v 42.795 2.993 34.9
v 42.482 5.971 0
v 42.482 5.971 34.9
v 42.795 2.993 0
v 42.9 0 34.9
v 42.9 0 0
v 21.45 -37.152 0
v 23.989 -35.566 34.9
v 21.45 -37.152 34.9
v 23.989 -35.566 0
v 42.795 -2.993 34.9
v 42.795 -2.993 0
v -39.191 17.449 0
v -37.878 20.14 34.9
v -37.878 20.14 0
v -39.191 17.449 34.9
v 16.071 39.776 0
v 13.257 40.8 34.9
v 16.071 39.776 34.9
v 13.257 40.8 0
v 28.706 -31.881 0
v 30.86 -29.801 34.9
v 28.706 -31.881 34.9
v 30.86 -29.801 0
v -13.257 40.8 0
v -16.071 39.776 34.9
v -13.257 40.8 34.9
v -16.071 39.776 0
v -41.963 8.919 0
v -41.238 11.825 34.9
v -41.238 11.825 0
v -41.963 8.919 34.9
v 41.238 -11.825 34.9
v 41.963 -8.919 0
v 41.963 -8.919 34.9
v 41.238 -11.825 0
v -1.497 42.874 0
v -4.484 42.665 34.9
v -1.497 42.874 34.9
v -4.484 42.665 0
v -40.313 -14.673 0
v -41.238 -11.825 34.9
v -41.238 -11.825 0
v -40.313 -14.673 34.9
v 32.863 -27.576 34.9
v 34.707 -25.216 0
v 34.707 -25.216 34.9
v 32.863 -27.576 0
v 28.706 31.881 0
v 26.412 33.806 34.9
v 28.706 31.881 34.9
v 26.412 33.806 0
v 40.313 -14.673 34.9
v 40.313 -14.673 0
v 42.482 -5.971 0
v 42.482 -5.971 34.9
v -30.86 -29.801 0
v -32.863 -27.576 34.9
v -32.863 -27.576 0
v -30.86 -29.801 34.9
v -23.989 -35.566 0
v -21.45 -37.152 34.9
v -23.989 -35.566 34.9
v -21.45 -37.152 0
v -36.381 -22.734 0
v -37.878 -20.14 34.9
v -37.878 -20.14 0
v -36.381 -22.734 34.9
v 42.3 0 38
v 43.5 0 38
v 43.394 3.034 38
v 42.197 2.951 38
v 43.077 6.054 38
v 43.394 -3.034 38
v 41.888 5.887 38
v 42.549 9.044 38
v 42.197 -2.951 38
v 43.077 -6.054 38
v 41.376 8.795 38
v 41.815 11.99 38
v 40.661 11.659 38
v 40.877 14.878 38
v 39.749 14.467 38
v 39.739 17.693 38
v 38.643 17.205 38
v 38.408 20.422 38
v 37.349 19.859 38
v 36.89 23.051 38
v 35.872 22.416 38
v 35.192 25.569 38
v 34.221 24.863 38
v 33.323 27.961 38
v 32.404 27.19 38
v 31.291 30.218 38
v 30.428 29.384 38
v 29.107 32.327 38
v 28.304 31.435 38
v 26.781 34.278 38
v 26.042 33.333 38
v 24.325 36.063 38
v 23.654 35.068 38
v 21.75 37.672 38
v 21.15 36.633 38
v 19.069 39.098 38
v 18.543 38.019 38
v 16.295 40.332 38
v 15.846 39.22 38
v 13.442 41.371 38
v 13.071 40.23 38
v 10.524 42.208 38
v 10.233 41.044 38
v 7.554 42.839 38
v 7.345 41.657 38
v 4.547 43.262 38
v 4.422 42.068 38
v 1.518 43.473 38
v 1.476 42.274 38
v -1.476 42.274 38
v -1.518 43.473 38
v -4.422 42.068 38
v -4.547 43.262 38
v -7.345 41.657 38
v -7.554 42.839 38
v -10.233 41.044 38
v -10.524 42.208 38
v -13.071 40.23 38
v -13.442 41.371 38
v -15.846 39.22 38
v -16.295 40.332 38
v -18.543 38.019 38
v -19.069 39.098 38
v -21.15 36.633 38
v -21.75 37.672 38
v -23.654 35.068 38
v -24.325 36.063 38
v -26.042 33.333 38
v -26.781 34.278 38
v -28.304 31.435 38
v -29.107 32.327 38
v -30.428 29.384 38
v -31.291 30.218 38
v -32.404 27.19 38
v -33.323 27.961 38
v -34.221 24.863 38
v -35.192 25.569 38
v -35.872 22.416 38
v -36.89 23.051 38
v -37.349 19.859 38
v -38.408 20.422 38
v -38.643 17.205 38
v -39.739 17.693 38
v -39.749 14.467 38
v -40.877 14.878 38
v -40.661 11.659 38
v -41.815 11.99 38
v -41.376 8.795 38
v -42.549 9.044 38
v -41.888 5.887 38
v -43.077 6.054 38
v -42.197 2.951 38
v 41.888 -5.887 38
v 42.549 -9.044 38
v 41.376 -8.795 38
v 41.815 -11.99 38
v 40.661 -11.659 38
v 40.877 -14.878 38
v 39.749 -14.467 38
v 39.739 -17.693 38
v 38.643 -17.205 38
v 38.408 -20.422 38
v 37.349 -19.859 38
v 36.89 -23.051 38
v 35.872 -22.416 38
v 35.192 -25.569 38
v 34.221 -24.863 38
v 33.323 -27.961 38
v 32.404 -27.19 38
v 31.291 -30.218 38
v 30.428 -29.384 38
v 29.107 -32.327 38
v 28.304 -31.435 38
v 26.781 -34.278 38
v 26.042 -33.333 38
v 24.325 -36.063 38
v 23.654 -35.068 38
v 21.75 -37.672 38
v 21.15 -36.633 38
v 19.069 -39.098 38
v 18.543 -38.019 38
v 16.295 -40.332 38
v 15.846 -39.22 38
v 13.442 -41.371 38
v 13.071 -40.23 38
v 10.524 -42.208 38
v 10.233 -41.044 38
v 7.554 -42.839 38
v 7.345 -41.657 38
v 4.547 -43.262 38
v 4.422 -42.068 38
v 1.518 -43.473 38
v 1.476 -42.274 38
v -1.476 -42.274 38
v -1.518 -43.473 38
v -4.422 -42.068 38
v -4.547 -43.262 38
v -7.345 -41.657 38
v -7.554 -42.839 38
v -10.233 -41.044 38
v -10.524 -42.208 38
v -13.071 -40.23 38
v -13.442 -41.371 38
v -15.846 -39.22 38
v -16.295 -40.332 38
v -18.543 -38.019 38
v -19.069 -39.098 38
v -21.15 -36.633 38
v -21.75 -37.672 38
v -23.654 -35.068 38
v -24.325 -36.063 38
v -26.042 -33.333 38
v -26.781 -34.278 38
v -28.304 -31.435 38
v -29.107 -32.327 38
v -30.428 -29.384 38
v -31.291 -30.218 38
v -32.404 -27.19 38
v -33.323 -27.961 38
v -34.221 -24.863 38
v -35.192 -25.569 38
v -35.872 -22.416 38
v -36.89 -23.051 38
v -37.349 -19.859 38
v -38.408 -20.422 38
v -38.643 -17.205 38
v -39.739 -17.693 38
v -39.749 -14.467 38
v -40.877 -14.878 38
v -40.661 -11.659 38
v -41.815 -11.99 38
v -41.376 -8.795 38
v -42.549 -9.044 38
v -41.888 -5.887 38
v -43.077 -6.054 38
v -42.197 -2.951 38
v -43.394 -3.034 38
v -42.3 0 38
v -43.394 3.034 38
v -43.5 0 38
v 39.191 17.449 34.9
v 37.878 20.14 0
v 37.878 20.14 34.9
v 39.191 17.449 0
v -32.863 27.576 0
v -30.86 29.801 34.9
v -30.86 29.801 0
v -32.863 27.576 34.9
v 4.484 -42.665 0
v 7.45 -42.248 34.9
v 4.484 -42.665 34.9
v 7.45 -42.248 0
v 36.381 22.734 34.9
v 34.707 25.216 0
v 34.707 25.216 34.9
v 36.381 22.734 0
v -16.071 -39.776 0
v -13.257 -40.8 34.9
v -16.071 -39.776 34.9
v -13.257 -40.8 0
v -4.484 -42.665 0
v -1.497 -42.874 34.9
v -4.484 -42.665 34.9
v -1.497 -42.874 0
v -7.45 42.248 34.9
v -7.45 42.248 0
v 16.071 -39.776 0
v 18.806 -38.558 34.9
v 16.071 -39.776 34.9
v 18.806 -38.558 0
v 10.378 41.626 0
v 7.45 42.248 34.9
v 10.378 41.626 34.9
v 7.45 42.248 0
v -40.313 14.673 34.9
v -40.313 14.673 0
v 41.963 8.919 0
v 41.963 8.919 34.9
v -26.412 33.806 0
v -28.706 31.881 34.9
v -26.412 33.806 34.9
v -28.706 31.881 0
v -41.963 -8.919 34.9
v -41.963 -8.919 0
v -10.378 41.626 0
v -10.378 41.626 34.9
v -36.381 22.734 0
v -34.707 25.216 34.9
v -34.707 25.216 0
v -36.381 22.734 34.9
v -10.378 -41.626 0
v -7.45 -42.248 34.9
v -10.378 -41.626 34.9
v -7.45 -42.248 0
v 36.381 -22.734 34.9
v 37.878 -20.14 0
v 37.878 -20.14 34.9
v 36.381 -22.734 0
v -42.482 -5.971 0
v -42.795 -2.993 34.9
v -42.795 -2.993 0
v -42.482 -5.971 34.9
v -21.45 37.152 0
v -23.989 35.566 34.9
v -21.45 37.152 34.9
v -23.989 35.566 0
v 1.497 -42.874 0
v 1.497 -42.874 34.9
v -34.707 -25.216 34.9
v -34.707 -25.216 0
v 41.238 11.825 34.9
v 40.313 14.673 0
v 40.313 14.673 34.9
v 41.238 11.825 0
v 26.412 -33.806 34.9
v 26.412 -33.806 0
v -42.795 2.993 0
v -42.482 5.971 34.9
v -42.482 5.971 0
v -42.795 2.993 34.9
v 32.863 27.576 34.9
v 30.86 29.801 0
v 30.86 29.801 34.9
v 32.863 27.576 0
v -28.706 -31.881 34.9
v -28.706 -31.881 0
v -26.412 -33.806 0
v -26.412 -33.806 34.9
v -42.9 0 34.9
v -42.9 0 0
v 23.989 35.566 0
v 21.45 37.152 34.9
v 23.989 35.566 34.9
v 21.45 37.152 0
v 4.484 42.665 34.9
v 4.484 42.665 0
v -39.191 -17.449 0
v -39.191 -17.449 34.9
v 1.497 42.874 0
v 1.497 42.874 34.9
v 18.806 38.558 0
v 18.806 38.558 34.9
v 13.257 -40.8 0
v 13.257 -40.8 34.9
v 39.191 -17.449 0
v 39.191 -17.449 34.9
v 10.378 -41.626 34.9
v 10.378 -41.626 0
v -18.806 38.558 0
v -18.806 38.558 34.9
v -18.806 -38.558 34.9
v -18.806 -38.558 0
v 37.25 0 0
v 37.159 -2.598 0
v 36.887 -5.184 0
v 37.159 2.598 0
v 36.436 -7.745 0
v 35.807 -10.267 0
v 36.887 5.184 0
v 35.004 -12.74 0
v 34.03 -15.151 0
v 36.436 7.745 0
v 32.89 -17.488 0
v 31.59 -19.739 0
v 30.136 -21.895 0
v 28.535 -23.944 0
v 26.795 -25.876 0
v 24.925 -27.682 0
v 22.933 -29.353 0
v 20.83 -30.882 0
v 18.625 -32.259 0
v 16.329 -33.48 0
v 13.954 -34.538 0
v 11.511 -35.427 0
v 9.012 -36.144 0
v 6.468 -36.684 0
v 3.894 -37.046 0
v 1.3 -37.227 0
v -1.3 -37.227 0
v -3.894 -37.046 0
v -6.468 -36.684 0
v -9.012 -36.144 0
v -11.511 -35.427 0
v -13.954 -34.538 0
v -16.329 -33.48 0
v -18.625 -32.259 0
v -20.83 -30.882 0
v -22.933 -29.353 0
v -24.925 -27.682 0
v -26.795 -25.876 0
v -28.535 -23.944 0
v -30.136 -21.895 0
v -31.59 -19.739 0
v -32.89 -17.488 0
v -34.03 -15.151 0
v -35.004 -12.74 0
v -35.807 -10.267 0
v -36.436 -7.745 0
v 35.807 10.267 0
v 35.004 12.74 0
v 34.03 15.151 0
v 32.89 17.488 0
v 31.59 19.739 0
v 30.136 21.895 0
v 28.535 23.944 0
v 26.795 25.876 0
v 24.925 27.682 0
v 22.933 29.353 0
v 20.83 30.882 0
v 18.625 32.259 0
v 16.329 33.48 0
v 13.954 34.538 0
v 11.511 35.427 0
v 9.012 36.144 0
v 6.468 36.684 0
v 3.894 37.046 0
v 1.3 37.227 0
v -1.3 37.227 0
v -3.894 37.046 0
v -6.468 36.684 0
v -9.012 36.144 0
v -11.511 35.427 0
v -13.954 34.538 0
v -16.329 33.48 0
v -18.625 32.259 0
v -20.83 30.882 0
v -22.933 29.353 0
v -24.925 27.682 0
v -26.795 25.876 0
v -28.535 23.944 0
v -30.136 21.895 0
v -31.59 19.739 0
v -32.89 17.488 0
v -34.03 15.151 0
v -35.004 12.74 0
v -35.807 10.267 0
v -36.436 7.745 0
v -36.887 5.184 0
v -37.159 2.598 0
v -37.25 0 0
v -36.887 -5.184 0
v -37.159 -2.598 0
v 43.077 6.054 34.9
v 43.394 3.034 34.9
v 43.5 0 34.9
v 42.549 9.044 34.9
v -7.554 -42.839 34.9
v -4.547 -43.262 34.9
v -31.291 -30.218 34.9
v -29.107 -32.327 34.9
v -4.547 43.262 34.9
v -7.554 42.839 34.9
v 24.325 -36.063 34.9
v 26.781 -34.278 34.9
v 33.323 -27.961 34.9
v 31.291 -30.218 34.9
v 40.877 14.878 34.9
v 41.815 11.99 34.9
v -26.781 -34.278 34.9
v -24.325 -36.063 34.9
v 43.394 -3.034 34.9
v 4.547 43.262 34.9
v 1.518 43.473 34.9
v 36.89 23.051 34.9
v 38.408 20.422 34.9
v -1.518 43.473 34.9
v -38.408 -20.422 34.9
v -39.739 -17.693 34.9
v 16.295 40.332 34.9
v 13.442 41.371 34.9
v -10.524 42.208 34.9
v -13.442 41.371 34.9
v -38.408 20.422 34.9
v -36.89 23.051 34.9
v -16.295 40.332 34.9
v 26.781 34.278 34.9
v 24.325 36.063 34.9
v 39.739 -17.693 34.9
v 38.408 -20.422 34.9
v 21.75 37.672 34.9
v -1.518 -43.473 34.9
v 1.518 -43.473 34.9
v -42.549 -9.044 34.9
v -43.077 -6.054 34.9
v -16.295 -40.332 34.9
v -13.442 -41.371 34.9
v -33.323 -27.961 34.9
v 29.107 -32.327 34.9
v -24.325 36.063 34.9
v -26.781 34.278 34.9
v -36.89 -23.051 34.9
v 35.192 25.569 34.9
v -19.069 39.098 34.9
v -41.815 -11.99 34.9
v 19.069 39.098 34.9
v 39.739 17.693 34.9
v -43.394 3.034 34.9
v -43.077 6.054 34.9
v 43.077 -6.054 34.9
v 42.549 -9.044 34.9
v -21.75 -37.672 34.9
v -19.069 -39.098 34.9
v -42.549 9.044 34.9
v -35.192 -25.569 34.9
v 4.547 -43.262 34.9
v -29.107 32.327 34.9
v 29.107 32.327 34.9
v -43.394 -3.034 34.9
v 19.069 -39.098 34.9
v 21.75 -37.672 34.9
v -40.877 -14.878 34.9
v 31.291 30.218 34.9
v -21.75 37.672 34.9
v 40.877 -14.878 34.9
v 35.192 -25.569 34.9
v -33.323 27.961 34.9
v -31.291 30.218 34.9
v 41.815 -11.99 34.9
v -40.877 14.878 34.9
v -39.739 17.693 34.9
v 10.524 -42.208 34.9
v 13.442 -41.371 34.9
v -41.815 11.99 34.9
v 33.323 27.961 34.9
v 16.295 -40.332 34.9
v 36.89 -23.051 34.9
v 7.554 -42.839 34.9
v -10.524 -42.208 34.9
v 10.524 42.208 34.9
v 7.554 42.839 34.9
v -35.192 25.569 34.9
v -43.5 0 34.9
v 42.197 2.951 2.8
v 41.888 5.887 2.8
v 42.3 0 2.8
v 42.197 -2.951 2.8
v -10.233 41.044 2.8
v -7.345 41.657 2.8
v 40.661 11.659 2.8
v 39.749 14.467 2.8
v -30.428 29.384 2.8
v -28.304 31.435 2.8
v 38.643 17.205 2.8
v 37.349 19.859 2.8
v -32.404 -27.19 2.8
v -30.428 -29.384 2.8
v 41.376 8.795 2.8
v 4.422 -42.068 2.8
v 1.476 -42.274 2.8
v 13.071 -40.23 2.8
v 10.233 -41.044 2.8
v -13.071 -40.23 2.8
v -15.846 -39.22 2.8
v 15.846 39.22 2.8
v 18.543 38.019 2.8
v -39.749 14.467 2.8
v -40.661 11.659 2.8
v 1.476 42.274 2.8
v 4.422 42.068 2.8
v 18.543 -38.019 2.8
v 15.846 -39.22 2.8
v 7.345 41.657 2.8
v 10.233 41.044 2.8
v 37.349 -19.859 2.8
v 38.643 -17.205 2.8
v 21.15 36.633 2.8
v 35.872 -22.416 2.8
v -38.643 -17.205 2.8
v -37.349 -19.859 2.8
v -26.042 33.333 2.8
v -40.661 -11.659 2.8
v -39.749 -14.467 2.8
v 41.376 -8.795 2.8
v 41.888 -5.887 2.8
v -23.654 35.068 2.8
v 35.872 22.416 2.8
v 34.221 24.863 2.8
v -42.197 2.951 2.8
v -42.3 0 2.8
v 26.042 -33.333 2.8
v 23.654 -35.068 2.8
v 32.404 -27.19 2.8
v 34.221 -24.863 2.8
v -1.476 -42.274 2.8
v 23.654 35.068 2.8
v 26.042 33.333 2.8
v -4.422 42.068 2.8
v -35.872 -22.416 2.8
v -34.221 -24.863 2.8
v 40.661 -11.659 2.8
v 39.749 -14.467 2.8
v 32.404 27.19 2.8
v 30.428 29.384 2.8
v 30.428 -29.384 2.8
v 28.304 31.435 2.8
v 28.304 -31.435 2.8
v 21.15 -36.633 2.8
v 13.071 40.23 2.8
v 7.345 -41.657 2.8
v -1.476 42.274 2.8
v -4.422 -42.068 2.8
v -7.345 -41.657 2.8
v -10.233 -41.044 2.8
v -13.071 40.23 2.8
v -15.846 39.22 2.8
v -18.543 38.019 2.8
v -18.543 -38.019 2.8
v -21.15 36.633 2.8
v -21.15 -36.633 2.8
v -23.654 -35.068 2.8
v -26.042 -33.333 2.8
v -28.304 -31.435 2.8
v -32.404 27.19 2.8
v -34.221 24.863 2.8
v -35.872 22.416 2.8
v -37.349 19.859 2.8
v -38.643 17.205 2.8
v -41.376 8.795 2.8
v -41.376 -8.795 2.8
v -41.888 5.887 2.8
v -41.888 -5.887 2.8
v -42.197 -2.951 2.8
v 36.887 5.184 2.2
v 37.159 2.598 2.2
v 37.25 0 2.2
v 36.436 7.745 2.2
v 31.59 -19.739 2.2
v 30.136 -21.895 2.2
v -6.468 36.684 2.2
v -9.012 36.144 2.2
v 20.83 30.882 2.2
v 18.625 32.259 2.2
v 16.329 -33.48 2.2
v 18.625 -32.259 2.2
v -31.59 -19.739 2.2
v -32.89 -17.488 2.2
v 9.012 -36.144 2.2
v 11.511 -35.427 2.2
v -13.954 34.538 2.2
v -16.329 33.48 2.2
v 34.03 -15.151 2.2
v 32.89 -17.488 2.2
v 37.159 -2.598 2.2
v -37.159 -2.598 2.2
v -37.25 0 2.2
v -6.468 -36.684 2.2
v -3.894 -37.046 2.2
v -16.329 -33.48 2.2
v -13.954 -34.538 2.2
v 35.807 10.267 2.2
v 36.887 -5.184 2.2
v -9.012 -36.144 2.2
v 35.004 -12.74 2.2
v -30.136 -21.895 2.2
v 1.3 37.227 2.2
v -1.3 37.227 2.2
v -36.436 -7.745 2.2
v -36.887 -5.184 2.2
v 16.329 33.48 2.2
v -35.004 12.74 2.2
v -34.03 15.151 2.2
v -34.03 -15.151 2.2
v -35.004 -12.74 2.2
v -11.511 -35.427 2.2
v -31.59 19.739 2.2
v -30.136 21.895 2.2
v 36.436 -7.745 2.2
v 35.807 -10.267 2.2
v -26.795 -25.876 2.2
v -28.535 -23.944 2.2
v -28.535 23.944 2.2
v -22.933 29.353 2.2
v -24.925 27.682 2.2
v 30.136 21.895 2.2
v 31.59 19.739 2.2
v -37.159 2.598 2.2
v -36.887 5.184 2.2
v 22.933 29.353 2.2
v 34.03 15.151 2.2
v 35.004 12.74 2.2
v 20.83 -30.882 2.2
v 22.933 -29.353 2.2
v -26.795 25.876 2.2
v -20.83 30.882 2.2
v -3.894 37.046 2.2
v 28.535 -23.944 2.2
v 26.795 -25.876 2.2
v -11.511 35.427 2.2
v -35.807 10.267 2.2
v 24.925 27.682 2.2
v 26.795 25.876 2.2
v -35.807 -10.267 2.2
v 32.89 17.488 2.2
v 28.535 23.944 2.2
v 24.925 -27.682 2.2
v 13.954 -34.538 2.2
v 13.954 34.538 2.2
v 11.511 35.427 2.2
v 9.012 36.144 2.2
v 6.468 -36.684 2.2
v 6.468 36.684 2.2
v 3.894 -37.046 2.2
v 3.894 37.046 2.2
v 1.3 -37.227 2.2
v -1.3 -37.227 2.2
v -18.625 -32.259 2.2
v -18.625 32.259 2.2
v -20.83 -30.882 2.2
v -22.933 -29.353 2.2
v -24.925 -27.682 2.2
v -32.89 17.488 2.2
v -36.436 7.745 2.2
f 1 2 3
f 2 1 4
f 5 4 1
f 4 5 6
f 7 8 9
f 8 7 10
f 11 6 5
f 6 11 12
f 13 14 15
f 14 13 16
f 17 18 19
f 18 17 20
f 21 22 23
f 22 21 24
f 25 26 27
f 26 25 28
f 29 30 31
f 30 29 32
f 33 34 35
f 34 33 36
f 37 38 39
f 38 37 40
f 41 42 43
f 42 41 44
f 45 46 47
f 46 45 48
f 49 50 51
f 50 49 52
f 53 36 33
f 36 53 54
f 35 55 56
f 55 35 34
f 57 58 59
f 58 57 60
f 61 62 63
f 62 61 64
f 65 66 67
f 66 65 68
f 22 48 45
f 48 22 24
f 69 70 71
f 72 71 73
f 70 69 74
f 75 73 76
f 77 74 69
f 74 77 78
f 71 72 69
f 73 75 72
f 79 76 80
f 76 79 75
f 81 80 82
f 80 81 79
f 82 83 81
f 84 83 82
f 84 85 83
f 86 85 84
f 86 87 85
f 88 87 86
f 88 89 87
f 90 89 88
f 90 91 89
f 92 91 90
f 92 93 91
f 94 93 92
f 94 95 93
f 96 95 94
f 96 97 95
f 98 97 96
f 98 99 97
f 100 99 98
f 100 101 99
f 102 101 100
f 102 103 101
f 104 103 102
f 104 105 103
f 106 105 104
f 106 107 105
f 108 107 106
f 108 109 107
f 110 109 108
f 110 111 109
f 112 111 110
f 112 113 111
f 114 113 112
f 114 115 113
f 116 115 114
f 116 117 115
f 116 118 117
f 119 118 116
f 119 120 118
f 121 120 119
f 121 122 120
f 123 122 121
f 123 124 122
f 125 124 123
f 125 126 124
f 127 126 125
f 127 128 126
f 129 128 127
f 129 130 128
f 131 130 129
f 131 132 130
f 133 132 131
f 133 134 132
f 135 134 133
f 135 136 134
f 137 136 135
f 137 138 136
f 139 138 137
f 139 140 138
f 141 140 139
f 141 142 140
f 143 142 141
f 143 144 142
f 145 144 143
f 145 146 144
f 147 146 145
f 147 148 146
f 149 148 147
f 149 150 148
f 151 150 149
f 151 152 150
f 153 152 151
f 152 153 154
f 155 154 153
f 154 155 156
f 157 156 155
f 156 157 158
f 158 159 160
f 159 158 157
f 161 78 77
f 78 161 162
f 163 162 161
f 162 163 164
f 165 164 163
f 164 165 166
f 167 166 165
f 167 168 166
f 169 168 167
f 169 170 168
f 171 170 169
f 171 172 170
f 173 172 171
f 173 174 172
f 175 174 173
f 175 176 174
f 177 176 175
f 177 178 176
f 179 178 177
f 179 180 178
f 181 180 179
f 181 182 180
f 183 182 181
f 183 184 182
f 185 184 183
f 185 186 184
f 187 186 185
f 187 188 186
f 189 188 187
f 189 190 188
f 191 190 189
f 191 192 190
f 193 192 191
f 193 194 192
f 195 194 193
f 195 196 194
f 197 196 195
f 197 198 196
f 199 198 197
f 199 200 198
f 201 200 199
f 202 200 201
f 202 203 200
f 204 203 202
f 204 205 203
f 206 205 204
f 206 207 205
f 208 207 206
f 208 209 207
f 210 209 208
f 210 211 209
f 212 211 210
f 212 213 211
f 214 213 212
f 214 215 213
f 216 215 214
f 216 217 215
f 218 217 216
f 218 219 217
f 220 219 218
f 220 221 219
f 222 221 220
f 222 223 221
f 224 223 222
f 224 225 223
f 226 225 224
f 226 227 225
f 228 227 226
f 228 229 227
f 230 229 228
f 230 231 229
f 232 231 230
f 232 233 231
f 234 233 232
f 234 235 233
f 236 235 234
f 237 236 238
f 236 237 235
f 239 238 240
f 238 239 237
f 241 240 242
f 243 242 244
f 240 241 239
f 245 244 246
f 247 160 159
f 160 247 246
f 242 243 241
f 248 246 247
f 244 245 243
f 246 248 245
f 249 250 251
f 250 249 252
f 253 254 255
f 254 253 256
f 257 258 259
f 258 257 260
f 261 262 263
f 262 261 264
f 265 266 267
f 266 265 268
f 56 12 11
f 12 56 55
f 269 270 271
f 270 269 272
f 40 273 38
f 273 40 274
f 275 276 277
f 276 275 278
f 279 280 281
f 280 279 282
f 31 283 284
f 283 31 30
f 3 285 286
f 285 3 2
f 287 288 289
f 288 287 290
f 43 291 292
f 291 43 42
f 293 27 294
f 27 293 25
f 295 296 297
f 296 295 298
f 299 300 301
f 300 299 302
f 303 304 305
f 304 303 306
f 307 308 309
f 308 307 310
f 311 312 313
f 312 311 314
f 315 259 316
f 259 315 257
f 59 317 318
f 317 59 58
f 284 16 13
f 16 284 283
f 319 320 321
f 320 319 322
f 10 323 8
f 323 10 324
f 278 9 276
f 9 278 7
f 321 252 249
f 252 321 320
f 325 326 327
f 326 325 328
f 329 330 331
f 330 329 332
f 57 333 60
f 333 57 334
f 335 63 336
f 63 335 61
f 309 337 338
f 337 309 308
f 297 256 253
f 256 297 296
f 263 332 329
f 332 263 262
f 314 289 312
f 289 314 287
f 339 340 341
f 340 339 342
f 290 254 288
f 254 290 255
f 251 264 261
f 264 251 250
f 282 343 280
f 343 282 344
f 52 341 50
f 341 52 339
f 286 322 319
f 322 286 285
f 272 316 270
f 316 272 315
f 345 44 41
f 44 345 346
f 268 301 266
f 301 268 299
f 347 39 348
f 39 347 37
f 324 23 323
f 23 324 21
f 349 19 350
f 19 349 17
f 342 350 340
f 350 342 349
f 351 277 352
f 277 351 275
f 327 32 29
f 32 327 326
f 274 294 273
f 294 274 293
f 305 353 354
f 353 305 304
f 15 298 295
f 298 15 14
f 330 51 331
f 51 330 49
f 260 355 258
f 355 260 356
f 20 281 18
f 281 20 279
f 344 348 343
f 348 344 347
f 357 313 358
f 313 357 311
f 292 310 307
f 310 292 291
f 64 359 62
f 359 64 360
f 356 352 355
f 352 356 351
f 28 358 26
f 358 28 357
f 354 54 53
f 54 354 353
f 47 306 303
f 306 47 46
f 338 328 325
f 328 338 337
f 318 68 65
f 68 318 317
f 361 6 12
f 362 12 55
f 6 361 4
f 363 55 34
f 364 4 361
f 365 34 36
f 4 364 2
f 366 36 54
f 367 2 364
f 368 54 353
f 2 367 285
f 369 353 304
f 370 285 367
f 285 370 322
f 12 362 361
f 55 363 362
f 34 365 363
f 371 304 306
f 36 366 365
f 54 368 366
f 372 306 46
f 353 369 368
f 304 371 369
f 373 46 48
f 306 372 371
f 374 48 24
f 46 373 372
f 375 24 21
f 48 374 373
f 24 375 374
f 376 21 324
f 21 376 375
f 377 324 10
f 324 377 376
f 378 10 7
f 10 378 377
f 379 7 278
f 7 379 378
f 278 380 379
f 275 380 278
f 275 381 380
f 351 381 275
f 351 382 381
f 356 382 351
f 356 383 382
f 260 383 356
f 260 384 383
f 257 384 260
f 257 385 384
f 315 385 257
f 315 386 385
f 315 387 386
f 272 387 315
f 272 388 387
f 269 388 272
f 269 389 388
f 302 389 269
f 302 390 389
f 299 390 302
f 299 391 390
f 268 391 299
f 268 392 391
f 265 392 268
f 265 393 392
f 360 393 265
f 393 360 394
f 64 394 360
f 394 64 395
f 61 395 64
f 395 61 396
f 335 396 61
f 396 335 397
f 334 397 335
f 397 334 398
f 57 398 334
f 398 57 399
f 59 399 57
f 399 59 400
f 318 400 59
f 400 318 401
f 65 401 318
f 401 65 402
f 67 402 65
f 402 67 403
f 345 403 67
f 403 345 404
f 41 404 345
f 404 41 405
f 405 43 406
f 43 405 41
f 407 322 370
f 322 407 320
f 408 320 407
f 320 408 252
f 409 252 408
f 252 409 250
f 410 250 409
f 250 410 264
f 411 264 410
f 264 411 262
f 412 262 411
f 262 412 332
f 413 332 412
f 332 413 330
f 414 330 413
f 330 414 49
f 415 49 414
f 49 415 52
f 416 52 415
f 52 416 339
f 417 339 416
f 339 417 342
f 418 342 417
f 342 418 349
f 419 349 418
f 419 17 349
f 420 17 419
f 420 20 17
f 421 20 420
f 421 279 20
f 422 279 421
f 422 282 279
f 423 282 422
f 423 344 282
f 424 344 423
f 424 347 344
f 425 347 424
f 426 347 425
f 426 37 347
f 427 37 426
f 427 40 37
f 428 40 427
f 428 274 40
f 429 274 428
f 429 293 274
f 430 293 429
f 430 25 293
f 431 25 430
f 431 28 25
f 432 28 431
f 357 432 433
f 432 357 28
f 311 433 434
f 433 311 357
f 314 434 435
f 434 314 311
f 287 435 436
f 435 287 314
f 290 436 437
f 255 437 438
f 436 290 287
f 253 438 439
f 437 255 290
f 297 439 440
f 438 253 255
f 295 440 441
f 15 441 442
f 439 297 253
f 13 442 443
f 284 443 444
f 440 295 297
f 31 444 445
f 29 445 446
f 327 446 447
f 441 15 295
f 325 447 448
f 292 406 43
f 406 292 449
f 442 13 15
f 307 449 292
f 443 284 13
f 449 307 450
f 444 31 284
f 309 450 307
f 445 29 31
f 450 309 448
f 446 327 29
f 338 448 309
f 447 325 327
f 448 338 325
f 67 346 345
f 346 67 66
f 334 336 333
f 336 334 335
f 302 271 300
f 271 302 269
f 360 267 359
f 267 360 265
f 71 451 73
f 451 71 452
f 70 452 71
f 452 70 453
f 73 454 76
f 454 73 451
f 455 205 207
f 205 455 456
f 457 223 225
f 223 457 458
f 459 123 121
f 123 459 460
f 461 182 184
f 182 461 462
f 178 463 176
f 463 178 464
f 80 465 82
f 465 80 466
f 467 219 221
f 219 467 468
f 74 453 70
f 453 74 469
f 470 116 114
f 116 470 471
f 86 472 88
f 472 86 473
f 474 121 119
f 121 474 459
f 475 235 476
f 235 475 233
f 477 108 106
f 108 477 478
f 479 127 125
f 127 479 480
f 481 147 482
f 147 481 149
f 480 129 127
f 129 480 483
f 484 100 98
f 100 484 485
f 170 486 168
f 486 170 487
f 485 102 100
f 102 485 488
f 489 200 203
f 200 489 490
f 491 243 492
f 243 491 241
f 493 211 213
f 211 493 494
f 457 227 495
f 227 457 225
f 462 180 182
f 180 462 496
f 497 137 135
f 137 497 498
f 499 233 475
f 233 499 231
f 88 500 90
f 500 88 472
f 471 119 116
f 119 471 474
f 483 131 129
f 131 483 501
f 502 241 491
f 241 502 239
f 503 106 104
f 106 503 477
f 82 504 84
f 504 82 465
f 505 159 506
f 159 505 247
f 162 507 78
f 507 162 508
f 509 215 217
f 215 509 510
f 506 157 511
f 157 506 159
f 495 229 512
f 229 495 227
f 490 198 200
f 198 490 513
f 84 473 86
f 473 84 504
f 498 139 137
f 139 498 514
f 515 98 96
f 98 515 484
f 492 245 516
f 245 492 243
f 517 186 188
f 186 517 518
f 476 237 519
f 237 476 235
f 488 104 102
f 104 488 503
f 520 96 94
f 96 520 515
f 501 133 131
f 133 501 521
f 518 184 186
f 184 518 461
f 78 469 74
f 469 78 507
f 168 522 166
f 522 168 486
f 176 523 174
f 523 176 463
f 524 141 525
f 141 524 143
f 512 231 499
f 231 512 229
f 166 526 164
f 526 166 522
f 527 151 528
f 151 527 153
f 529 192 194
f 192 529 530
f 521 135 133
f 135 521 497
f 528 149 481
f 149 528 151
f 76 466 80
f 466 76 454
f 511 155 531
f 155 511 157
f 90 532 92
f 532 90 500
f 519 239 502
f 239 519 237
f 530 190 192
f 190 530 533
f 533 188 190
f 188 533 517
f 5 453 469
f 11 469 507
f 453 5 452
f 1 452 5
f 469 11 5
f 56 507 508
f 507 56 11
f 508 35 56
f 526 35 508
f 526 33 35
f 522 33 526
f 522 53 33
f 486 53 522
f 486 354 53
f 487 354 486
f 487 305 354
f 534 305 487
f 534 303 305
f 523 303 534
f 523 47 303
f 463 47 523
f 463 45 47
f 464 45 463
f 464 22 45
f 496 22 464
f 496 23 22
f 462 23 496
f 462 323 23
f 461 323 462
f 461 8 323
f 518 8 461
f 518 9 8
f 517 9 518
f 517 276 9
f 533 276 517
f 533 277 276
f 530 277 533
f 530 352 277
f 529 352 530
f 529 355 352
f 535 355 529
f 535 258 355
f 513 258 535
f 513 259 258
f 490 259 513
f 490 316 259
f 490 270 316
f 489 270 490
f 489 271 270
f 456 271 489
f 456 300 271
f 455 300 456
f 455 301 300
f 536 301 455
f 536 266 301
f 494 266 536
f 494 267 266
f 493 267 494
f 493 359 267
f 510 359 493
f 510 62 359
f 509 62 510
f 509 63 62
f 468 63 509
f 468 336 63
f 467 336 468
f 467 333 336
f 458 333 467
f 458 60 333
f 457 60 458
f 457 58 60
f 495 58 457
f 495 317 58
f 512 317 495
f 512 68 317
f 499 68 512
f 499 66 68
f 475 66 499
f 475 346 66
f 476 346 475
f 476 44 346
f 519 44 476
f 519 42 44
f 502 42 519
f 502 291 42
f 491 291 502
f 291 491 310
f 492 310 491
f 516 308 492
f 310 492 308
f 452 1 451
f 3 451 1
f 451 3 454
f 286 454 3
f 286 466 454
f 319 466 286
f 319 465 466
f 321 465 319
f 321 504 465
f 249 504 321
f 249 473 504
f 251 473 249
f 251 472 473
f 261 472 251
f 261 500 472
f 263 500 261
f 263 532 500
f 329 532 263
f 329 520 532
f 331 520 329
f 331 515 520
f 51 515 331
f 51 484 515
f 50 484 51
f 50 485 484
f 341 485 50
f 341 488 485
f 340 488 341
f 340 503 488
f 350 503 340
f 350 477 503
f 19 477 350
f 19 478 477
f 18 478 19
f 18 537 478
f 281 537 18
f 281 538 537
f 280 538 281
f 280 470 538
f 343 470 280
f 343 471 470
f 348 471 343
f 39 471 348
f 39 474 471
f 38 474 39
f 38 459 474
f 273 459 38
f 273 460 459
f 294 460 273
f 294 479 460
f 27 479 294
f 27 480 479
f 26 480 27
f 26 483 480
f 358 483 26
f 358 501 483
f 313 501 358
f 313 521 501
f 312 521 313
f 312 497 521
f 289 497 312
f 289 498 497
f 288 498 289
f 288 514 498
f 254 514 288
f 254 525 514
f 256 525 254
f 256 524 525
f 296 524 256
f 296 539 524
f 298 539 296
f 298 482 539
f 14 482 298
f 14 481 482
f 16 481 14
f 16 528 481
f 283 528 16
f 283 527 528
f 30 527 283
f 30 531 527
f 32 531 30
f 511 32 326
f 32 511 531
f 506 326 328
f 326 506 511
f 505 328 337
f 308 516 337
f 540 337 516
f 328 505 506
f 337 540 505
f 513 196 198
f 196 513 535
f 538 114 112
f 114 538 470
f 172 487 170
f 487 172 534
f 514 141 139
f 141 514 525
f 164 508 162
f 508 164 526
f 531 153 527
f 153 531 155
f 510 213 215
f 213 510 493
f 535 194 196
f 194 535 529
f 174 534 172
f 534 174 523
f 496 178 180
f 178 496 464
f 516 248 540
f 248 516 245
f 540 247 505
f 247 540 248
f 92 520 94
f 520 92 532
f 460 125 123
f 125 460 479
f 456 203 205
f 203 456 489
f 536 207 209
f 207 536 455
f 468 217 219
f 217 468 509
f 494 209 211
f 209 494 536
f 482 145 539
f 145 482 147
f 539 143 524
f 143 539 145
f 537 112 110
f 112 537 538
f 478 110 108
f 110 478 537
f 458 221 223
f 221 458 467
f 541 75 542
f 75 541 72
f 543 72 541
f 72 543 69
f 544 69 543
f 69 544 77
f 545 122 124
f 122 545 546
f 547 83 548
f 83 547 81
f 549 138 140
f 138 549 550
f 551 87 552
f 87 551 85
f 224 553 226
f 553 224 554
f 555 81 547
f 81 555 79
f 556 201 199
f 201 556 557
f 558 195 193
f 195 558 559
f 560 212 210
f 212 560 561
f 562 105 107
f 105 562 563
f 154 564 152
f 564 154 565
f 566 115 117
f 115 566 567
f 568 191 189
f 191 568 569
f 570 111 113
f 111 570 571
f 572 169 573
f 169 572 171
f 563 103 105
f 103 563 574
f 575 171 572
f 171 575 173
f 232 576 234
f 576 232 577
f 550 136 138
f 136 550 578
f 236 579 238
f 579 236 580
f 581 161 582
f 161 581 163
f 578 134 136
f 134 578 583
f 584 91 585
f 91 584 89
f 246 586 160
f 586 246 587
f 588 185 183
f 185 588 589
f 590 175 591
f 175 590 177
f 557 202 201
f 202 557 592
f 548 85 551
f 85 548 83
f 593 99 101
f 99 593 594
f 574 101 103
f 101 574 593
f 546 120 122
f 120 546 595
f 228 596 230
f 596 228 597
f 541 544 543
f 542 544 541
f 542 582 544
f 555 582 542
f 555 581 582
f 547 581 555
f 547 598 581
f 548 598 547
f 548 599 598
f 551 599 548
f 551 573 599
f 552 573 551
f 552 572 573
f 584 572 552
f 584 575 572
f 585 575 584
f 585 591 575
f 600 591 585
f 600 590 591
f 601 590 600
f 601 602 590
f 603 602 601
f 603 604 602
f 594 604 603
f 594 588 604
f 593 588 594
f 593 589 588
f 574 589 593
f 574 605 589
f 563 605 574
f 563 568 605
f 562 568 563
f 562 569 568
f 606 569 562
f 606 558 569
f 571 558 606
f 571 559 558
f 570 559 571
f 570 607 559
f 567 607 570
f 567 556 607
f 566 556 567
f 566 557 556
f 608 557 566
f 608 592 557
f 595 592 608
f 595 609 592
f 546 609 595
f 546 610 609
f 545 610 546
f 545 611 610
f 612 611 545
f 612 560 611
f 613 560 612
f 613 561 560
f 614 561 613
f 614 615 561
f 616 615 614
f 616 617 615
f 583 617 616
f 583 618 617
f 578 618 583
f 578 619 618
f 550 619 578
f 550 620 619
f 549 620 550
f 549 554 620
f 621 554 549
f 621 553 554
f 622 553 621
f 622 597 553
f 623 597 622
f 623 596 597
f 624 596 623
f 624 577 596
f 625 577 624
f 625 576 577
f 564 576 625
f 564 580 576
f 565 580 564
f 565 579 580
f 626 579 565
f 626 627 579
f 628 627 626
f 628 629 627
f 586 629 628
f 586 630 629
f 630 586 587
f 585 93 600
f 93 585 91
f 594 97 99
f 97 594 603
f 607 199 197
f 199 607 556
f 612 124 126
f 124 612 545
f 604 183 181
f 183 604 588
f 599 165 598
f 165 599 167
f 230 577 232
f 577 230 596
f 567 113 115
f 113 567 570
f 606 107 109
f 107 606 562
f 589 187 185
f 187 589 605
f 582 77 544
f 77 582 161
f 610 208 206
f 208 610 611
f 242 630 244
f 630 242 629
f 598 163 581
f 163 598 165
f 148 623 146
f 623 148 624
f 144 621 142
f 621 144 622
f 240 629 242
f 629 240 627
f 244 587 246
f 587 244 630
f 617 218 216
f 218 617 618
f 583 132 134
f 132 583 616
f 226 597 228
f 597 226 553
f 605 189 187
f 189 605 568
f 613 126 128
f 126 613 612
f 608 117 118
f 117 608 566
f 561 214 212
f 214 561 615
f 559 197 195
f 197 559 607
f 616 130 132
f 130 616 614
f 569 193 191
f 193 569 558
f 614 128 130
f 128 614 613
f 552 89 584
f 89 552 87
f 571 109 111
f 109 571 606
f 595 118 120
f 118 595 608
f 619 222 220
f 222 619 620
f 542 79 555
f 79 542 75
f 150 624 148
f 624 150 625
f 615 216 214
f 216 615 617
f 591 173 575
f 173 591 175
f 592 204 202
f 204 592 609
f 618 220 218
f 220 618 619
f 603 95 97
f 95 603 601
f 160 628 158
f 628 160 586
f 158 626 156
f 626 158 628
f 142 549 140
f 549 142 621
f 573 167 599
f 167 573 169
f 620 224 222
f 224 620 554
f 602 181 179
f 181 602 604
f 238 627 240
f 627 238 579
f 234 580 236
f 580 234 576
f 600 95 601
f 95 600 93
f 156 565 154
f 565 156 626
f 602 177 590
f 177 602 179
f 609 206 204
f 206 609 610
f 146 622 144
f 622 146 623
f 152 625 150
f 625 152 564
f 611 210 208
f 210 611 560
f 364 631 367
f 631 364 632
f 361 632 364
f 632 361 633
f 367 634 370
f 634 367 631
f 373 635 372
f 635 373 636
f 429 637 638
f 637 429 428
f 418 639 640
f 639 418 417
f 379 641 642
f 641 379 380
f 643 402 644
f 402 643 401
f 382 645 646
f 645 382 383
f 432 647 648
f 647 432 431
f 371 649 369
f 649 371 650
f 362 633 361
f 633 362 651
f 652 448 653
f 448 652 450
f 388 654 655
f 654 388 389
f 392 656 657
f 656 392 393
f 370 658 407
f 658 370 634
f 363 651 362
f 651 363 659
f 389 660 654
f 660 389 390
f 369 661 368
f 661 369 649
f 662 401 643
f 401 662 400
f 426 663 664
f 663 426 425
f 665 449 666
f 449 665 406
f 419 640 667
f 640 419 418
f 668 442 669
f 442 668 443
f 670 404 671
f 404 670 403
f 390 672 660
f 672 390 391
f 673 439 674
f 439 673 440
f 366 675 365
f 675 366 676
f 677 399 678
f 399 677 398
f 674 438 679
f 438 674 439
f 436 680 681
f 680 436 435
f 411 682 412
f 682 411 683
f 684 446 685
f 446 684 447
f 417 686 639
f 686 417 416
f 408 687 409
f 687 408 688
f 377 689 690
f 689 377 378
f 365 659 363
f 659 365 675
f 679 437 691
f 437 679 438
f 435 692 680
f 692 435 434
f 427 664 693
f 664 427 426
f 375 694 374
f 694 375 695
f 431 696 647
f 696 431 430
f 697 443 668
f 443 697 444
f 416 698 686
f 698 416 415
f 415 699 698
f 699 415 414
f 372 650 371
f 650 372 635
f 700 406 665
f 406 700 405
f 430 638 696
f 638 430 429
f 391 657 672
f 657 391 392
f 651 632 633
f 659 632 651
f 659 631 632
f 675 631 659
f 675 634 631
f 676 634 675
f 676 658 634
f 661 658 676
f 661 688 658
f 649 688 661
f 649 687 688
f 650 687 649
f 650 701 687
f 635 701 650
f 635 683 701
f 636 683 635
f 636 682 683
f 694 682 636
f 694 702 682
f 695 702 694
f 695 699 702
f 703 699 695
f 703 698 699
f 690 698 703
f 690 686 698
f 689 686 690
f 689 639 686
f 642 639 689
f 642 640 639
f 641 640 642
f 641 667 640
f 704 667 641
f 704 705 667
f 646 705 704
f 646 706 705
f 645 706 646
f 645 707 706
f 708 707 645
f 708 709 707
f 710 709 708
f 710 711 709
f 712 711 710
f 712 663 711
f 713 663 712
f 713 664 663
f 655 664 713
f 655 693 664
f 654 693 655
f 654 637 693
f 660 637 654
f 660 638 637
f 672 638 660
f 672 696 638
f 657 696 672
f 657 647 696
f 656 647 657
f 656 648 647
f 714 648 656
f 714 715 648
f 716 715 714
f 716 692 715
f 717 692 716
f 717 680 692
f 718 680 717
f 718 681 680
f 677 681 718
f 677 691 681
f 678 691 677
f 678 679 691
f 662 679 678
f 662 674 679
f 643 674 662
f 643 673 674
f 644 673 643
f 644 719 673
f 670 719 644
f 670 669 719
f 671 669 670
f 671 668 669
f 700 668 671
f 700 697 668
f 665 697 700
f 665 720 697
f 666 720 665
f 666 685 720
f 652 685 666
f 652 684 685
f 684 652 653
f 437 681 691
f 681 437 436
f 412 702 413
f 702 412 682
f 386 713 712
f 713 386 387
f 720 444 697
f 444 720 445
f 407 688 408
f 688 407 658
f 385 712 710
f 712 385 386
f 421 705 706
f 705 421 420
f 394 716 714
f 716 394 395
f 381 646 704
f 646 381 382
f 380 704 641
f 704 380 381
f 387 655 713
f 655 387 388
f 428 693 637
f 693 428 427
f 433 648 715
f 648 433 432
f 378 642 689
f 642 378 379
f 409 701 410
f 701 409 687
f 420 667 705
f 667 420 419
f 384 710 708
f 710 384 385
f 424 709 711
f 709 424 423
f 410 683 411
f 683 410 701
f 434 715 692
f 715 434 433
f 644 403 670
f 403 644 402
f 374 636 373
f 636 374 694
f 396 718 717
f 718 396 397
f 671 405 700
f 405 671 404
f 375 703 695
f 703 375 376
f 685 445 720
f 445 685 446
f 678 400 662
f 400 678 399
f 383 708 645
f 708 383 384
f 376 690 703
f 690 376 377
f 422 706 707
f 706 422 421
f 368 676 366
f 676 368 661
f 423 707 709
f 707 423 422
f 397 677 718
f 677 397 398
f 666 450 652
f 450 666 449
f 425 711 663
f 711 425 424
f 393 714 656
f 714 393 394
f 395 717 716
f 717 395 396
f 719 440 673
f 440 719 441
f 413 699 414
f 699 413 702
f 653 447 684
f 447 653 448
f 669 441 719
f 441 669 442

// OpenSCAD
can_Height = 38; //[10:0.1:200]
can_Diameter = 85.8; //[20:0.1:200]
can_Thickness = 0.6; //[0.1:0.1:2]

can_Top_Rim_Thickness = 1.2; //[0:0.1:4]
can_Top_Rim_Height = 3.1; //[0:0.1:10]

can_Bot_Rim_Thickness = 0; //[0:0.1:4]
can_Bot_Rim_Height = 0; //[0:0.1:10]

can_Bot_Indent_Depth = 2.2; //[0:0.1:20]
can_Bot_Indent_Diameter = 74.5; //[10:0.1:200]

empty = true;


$fs = 1;
$fa = 4;

difference() {
    union() {
        cylinder(d=can_Diameter, h=can_Height);
        
        translate([0,0,can_Height - can_Top_Rim_Height])
        cylinder(d=((can_Top_Rim_Thickness - can_Thickness)*2 + can_Diameter), h=can_Top_Rim_Height);
        
        cylinder(d=((can_Bot_Rim_Thickness - can_Thickness)*2 + can_Diameter), h=can_Bot_Rim_Height);
    }
    if(empty) {
        translate([0,0,can_Thickness + can_Bot_Indent_Depth])
        cylinder(d=can_Diameter - 2*can_Thickness, h=can_Height);
    }
    translate([0,0,-0.01])
    cylinder(d=can_Bot_Indent_Diameter, h=can_Bot_Indent_Depth+0.01);
}
